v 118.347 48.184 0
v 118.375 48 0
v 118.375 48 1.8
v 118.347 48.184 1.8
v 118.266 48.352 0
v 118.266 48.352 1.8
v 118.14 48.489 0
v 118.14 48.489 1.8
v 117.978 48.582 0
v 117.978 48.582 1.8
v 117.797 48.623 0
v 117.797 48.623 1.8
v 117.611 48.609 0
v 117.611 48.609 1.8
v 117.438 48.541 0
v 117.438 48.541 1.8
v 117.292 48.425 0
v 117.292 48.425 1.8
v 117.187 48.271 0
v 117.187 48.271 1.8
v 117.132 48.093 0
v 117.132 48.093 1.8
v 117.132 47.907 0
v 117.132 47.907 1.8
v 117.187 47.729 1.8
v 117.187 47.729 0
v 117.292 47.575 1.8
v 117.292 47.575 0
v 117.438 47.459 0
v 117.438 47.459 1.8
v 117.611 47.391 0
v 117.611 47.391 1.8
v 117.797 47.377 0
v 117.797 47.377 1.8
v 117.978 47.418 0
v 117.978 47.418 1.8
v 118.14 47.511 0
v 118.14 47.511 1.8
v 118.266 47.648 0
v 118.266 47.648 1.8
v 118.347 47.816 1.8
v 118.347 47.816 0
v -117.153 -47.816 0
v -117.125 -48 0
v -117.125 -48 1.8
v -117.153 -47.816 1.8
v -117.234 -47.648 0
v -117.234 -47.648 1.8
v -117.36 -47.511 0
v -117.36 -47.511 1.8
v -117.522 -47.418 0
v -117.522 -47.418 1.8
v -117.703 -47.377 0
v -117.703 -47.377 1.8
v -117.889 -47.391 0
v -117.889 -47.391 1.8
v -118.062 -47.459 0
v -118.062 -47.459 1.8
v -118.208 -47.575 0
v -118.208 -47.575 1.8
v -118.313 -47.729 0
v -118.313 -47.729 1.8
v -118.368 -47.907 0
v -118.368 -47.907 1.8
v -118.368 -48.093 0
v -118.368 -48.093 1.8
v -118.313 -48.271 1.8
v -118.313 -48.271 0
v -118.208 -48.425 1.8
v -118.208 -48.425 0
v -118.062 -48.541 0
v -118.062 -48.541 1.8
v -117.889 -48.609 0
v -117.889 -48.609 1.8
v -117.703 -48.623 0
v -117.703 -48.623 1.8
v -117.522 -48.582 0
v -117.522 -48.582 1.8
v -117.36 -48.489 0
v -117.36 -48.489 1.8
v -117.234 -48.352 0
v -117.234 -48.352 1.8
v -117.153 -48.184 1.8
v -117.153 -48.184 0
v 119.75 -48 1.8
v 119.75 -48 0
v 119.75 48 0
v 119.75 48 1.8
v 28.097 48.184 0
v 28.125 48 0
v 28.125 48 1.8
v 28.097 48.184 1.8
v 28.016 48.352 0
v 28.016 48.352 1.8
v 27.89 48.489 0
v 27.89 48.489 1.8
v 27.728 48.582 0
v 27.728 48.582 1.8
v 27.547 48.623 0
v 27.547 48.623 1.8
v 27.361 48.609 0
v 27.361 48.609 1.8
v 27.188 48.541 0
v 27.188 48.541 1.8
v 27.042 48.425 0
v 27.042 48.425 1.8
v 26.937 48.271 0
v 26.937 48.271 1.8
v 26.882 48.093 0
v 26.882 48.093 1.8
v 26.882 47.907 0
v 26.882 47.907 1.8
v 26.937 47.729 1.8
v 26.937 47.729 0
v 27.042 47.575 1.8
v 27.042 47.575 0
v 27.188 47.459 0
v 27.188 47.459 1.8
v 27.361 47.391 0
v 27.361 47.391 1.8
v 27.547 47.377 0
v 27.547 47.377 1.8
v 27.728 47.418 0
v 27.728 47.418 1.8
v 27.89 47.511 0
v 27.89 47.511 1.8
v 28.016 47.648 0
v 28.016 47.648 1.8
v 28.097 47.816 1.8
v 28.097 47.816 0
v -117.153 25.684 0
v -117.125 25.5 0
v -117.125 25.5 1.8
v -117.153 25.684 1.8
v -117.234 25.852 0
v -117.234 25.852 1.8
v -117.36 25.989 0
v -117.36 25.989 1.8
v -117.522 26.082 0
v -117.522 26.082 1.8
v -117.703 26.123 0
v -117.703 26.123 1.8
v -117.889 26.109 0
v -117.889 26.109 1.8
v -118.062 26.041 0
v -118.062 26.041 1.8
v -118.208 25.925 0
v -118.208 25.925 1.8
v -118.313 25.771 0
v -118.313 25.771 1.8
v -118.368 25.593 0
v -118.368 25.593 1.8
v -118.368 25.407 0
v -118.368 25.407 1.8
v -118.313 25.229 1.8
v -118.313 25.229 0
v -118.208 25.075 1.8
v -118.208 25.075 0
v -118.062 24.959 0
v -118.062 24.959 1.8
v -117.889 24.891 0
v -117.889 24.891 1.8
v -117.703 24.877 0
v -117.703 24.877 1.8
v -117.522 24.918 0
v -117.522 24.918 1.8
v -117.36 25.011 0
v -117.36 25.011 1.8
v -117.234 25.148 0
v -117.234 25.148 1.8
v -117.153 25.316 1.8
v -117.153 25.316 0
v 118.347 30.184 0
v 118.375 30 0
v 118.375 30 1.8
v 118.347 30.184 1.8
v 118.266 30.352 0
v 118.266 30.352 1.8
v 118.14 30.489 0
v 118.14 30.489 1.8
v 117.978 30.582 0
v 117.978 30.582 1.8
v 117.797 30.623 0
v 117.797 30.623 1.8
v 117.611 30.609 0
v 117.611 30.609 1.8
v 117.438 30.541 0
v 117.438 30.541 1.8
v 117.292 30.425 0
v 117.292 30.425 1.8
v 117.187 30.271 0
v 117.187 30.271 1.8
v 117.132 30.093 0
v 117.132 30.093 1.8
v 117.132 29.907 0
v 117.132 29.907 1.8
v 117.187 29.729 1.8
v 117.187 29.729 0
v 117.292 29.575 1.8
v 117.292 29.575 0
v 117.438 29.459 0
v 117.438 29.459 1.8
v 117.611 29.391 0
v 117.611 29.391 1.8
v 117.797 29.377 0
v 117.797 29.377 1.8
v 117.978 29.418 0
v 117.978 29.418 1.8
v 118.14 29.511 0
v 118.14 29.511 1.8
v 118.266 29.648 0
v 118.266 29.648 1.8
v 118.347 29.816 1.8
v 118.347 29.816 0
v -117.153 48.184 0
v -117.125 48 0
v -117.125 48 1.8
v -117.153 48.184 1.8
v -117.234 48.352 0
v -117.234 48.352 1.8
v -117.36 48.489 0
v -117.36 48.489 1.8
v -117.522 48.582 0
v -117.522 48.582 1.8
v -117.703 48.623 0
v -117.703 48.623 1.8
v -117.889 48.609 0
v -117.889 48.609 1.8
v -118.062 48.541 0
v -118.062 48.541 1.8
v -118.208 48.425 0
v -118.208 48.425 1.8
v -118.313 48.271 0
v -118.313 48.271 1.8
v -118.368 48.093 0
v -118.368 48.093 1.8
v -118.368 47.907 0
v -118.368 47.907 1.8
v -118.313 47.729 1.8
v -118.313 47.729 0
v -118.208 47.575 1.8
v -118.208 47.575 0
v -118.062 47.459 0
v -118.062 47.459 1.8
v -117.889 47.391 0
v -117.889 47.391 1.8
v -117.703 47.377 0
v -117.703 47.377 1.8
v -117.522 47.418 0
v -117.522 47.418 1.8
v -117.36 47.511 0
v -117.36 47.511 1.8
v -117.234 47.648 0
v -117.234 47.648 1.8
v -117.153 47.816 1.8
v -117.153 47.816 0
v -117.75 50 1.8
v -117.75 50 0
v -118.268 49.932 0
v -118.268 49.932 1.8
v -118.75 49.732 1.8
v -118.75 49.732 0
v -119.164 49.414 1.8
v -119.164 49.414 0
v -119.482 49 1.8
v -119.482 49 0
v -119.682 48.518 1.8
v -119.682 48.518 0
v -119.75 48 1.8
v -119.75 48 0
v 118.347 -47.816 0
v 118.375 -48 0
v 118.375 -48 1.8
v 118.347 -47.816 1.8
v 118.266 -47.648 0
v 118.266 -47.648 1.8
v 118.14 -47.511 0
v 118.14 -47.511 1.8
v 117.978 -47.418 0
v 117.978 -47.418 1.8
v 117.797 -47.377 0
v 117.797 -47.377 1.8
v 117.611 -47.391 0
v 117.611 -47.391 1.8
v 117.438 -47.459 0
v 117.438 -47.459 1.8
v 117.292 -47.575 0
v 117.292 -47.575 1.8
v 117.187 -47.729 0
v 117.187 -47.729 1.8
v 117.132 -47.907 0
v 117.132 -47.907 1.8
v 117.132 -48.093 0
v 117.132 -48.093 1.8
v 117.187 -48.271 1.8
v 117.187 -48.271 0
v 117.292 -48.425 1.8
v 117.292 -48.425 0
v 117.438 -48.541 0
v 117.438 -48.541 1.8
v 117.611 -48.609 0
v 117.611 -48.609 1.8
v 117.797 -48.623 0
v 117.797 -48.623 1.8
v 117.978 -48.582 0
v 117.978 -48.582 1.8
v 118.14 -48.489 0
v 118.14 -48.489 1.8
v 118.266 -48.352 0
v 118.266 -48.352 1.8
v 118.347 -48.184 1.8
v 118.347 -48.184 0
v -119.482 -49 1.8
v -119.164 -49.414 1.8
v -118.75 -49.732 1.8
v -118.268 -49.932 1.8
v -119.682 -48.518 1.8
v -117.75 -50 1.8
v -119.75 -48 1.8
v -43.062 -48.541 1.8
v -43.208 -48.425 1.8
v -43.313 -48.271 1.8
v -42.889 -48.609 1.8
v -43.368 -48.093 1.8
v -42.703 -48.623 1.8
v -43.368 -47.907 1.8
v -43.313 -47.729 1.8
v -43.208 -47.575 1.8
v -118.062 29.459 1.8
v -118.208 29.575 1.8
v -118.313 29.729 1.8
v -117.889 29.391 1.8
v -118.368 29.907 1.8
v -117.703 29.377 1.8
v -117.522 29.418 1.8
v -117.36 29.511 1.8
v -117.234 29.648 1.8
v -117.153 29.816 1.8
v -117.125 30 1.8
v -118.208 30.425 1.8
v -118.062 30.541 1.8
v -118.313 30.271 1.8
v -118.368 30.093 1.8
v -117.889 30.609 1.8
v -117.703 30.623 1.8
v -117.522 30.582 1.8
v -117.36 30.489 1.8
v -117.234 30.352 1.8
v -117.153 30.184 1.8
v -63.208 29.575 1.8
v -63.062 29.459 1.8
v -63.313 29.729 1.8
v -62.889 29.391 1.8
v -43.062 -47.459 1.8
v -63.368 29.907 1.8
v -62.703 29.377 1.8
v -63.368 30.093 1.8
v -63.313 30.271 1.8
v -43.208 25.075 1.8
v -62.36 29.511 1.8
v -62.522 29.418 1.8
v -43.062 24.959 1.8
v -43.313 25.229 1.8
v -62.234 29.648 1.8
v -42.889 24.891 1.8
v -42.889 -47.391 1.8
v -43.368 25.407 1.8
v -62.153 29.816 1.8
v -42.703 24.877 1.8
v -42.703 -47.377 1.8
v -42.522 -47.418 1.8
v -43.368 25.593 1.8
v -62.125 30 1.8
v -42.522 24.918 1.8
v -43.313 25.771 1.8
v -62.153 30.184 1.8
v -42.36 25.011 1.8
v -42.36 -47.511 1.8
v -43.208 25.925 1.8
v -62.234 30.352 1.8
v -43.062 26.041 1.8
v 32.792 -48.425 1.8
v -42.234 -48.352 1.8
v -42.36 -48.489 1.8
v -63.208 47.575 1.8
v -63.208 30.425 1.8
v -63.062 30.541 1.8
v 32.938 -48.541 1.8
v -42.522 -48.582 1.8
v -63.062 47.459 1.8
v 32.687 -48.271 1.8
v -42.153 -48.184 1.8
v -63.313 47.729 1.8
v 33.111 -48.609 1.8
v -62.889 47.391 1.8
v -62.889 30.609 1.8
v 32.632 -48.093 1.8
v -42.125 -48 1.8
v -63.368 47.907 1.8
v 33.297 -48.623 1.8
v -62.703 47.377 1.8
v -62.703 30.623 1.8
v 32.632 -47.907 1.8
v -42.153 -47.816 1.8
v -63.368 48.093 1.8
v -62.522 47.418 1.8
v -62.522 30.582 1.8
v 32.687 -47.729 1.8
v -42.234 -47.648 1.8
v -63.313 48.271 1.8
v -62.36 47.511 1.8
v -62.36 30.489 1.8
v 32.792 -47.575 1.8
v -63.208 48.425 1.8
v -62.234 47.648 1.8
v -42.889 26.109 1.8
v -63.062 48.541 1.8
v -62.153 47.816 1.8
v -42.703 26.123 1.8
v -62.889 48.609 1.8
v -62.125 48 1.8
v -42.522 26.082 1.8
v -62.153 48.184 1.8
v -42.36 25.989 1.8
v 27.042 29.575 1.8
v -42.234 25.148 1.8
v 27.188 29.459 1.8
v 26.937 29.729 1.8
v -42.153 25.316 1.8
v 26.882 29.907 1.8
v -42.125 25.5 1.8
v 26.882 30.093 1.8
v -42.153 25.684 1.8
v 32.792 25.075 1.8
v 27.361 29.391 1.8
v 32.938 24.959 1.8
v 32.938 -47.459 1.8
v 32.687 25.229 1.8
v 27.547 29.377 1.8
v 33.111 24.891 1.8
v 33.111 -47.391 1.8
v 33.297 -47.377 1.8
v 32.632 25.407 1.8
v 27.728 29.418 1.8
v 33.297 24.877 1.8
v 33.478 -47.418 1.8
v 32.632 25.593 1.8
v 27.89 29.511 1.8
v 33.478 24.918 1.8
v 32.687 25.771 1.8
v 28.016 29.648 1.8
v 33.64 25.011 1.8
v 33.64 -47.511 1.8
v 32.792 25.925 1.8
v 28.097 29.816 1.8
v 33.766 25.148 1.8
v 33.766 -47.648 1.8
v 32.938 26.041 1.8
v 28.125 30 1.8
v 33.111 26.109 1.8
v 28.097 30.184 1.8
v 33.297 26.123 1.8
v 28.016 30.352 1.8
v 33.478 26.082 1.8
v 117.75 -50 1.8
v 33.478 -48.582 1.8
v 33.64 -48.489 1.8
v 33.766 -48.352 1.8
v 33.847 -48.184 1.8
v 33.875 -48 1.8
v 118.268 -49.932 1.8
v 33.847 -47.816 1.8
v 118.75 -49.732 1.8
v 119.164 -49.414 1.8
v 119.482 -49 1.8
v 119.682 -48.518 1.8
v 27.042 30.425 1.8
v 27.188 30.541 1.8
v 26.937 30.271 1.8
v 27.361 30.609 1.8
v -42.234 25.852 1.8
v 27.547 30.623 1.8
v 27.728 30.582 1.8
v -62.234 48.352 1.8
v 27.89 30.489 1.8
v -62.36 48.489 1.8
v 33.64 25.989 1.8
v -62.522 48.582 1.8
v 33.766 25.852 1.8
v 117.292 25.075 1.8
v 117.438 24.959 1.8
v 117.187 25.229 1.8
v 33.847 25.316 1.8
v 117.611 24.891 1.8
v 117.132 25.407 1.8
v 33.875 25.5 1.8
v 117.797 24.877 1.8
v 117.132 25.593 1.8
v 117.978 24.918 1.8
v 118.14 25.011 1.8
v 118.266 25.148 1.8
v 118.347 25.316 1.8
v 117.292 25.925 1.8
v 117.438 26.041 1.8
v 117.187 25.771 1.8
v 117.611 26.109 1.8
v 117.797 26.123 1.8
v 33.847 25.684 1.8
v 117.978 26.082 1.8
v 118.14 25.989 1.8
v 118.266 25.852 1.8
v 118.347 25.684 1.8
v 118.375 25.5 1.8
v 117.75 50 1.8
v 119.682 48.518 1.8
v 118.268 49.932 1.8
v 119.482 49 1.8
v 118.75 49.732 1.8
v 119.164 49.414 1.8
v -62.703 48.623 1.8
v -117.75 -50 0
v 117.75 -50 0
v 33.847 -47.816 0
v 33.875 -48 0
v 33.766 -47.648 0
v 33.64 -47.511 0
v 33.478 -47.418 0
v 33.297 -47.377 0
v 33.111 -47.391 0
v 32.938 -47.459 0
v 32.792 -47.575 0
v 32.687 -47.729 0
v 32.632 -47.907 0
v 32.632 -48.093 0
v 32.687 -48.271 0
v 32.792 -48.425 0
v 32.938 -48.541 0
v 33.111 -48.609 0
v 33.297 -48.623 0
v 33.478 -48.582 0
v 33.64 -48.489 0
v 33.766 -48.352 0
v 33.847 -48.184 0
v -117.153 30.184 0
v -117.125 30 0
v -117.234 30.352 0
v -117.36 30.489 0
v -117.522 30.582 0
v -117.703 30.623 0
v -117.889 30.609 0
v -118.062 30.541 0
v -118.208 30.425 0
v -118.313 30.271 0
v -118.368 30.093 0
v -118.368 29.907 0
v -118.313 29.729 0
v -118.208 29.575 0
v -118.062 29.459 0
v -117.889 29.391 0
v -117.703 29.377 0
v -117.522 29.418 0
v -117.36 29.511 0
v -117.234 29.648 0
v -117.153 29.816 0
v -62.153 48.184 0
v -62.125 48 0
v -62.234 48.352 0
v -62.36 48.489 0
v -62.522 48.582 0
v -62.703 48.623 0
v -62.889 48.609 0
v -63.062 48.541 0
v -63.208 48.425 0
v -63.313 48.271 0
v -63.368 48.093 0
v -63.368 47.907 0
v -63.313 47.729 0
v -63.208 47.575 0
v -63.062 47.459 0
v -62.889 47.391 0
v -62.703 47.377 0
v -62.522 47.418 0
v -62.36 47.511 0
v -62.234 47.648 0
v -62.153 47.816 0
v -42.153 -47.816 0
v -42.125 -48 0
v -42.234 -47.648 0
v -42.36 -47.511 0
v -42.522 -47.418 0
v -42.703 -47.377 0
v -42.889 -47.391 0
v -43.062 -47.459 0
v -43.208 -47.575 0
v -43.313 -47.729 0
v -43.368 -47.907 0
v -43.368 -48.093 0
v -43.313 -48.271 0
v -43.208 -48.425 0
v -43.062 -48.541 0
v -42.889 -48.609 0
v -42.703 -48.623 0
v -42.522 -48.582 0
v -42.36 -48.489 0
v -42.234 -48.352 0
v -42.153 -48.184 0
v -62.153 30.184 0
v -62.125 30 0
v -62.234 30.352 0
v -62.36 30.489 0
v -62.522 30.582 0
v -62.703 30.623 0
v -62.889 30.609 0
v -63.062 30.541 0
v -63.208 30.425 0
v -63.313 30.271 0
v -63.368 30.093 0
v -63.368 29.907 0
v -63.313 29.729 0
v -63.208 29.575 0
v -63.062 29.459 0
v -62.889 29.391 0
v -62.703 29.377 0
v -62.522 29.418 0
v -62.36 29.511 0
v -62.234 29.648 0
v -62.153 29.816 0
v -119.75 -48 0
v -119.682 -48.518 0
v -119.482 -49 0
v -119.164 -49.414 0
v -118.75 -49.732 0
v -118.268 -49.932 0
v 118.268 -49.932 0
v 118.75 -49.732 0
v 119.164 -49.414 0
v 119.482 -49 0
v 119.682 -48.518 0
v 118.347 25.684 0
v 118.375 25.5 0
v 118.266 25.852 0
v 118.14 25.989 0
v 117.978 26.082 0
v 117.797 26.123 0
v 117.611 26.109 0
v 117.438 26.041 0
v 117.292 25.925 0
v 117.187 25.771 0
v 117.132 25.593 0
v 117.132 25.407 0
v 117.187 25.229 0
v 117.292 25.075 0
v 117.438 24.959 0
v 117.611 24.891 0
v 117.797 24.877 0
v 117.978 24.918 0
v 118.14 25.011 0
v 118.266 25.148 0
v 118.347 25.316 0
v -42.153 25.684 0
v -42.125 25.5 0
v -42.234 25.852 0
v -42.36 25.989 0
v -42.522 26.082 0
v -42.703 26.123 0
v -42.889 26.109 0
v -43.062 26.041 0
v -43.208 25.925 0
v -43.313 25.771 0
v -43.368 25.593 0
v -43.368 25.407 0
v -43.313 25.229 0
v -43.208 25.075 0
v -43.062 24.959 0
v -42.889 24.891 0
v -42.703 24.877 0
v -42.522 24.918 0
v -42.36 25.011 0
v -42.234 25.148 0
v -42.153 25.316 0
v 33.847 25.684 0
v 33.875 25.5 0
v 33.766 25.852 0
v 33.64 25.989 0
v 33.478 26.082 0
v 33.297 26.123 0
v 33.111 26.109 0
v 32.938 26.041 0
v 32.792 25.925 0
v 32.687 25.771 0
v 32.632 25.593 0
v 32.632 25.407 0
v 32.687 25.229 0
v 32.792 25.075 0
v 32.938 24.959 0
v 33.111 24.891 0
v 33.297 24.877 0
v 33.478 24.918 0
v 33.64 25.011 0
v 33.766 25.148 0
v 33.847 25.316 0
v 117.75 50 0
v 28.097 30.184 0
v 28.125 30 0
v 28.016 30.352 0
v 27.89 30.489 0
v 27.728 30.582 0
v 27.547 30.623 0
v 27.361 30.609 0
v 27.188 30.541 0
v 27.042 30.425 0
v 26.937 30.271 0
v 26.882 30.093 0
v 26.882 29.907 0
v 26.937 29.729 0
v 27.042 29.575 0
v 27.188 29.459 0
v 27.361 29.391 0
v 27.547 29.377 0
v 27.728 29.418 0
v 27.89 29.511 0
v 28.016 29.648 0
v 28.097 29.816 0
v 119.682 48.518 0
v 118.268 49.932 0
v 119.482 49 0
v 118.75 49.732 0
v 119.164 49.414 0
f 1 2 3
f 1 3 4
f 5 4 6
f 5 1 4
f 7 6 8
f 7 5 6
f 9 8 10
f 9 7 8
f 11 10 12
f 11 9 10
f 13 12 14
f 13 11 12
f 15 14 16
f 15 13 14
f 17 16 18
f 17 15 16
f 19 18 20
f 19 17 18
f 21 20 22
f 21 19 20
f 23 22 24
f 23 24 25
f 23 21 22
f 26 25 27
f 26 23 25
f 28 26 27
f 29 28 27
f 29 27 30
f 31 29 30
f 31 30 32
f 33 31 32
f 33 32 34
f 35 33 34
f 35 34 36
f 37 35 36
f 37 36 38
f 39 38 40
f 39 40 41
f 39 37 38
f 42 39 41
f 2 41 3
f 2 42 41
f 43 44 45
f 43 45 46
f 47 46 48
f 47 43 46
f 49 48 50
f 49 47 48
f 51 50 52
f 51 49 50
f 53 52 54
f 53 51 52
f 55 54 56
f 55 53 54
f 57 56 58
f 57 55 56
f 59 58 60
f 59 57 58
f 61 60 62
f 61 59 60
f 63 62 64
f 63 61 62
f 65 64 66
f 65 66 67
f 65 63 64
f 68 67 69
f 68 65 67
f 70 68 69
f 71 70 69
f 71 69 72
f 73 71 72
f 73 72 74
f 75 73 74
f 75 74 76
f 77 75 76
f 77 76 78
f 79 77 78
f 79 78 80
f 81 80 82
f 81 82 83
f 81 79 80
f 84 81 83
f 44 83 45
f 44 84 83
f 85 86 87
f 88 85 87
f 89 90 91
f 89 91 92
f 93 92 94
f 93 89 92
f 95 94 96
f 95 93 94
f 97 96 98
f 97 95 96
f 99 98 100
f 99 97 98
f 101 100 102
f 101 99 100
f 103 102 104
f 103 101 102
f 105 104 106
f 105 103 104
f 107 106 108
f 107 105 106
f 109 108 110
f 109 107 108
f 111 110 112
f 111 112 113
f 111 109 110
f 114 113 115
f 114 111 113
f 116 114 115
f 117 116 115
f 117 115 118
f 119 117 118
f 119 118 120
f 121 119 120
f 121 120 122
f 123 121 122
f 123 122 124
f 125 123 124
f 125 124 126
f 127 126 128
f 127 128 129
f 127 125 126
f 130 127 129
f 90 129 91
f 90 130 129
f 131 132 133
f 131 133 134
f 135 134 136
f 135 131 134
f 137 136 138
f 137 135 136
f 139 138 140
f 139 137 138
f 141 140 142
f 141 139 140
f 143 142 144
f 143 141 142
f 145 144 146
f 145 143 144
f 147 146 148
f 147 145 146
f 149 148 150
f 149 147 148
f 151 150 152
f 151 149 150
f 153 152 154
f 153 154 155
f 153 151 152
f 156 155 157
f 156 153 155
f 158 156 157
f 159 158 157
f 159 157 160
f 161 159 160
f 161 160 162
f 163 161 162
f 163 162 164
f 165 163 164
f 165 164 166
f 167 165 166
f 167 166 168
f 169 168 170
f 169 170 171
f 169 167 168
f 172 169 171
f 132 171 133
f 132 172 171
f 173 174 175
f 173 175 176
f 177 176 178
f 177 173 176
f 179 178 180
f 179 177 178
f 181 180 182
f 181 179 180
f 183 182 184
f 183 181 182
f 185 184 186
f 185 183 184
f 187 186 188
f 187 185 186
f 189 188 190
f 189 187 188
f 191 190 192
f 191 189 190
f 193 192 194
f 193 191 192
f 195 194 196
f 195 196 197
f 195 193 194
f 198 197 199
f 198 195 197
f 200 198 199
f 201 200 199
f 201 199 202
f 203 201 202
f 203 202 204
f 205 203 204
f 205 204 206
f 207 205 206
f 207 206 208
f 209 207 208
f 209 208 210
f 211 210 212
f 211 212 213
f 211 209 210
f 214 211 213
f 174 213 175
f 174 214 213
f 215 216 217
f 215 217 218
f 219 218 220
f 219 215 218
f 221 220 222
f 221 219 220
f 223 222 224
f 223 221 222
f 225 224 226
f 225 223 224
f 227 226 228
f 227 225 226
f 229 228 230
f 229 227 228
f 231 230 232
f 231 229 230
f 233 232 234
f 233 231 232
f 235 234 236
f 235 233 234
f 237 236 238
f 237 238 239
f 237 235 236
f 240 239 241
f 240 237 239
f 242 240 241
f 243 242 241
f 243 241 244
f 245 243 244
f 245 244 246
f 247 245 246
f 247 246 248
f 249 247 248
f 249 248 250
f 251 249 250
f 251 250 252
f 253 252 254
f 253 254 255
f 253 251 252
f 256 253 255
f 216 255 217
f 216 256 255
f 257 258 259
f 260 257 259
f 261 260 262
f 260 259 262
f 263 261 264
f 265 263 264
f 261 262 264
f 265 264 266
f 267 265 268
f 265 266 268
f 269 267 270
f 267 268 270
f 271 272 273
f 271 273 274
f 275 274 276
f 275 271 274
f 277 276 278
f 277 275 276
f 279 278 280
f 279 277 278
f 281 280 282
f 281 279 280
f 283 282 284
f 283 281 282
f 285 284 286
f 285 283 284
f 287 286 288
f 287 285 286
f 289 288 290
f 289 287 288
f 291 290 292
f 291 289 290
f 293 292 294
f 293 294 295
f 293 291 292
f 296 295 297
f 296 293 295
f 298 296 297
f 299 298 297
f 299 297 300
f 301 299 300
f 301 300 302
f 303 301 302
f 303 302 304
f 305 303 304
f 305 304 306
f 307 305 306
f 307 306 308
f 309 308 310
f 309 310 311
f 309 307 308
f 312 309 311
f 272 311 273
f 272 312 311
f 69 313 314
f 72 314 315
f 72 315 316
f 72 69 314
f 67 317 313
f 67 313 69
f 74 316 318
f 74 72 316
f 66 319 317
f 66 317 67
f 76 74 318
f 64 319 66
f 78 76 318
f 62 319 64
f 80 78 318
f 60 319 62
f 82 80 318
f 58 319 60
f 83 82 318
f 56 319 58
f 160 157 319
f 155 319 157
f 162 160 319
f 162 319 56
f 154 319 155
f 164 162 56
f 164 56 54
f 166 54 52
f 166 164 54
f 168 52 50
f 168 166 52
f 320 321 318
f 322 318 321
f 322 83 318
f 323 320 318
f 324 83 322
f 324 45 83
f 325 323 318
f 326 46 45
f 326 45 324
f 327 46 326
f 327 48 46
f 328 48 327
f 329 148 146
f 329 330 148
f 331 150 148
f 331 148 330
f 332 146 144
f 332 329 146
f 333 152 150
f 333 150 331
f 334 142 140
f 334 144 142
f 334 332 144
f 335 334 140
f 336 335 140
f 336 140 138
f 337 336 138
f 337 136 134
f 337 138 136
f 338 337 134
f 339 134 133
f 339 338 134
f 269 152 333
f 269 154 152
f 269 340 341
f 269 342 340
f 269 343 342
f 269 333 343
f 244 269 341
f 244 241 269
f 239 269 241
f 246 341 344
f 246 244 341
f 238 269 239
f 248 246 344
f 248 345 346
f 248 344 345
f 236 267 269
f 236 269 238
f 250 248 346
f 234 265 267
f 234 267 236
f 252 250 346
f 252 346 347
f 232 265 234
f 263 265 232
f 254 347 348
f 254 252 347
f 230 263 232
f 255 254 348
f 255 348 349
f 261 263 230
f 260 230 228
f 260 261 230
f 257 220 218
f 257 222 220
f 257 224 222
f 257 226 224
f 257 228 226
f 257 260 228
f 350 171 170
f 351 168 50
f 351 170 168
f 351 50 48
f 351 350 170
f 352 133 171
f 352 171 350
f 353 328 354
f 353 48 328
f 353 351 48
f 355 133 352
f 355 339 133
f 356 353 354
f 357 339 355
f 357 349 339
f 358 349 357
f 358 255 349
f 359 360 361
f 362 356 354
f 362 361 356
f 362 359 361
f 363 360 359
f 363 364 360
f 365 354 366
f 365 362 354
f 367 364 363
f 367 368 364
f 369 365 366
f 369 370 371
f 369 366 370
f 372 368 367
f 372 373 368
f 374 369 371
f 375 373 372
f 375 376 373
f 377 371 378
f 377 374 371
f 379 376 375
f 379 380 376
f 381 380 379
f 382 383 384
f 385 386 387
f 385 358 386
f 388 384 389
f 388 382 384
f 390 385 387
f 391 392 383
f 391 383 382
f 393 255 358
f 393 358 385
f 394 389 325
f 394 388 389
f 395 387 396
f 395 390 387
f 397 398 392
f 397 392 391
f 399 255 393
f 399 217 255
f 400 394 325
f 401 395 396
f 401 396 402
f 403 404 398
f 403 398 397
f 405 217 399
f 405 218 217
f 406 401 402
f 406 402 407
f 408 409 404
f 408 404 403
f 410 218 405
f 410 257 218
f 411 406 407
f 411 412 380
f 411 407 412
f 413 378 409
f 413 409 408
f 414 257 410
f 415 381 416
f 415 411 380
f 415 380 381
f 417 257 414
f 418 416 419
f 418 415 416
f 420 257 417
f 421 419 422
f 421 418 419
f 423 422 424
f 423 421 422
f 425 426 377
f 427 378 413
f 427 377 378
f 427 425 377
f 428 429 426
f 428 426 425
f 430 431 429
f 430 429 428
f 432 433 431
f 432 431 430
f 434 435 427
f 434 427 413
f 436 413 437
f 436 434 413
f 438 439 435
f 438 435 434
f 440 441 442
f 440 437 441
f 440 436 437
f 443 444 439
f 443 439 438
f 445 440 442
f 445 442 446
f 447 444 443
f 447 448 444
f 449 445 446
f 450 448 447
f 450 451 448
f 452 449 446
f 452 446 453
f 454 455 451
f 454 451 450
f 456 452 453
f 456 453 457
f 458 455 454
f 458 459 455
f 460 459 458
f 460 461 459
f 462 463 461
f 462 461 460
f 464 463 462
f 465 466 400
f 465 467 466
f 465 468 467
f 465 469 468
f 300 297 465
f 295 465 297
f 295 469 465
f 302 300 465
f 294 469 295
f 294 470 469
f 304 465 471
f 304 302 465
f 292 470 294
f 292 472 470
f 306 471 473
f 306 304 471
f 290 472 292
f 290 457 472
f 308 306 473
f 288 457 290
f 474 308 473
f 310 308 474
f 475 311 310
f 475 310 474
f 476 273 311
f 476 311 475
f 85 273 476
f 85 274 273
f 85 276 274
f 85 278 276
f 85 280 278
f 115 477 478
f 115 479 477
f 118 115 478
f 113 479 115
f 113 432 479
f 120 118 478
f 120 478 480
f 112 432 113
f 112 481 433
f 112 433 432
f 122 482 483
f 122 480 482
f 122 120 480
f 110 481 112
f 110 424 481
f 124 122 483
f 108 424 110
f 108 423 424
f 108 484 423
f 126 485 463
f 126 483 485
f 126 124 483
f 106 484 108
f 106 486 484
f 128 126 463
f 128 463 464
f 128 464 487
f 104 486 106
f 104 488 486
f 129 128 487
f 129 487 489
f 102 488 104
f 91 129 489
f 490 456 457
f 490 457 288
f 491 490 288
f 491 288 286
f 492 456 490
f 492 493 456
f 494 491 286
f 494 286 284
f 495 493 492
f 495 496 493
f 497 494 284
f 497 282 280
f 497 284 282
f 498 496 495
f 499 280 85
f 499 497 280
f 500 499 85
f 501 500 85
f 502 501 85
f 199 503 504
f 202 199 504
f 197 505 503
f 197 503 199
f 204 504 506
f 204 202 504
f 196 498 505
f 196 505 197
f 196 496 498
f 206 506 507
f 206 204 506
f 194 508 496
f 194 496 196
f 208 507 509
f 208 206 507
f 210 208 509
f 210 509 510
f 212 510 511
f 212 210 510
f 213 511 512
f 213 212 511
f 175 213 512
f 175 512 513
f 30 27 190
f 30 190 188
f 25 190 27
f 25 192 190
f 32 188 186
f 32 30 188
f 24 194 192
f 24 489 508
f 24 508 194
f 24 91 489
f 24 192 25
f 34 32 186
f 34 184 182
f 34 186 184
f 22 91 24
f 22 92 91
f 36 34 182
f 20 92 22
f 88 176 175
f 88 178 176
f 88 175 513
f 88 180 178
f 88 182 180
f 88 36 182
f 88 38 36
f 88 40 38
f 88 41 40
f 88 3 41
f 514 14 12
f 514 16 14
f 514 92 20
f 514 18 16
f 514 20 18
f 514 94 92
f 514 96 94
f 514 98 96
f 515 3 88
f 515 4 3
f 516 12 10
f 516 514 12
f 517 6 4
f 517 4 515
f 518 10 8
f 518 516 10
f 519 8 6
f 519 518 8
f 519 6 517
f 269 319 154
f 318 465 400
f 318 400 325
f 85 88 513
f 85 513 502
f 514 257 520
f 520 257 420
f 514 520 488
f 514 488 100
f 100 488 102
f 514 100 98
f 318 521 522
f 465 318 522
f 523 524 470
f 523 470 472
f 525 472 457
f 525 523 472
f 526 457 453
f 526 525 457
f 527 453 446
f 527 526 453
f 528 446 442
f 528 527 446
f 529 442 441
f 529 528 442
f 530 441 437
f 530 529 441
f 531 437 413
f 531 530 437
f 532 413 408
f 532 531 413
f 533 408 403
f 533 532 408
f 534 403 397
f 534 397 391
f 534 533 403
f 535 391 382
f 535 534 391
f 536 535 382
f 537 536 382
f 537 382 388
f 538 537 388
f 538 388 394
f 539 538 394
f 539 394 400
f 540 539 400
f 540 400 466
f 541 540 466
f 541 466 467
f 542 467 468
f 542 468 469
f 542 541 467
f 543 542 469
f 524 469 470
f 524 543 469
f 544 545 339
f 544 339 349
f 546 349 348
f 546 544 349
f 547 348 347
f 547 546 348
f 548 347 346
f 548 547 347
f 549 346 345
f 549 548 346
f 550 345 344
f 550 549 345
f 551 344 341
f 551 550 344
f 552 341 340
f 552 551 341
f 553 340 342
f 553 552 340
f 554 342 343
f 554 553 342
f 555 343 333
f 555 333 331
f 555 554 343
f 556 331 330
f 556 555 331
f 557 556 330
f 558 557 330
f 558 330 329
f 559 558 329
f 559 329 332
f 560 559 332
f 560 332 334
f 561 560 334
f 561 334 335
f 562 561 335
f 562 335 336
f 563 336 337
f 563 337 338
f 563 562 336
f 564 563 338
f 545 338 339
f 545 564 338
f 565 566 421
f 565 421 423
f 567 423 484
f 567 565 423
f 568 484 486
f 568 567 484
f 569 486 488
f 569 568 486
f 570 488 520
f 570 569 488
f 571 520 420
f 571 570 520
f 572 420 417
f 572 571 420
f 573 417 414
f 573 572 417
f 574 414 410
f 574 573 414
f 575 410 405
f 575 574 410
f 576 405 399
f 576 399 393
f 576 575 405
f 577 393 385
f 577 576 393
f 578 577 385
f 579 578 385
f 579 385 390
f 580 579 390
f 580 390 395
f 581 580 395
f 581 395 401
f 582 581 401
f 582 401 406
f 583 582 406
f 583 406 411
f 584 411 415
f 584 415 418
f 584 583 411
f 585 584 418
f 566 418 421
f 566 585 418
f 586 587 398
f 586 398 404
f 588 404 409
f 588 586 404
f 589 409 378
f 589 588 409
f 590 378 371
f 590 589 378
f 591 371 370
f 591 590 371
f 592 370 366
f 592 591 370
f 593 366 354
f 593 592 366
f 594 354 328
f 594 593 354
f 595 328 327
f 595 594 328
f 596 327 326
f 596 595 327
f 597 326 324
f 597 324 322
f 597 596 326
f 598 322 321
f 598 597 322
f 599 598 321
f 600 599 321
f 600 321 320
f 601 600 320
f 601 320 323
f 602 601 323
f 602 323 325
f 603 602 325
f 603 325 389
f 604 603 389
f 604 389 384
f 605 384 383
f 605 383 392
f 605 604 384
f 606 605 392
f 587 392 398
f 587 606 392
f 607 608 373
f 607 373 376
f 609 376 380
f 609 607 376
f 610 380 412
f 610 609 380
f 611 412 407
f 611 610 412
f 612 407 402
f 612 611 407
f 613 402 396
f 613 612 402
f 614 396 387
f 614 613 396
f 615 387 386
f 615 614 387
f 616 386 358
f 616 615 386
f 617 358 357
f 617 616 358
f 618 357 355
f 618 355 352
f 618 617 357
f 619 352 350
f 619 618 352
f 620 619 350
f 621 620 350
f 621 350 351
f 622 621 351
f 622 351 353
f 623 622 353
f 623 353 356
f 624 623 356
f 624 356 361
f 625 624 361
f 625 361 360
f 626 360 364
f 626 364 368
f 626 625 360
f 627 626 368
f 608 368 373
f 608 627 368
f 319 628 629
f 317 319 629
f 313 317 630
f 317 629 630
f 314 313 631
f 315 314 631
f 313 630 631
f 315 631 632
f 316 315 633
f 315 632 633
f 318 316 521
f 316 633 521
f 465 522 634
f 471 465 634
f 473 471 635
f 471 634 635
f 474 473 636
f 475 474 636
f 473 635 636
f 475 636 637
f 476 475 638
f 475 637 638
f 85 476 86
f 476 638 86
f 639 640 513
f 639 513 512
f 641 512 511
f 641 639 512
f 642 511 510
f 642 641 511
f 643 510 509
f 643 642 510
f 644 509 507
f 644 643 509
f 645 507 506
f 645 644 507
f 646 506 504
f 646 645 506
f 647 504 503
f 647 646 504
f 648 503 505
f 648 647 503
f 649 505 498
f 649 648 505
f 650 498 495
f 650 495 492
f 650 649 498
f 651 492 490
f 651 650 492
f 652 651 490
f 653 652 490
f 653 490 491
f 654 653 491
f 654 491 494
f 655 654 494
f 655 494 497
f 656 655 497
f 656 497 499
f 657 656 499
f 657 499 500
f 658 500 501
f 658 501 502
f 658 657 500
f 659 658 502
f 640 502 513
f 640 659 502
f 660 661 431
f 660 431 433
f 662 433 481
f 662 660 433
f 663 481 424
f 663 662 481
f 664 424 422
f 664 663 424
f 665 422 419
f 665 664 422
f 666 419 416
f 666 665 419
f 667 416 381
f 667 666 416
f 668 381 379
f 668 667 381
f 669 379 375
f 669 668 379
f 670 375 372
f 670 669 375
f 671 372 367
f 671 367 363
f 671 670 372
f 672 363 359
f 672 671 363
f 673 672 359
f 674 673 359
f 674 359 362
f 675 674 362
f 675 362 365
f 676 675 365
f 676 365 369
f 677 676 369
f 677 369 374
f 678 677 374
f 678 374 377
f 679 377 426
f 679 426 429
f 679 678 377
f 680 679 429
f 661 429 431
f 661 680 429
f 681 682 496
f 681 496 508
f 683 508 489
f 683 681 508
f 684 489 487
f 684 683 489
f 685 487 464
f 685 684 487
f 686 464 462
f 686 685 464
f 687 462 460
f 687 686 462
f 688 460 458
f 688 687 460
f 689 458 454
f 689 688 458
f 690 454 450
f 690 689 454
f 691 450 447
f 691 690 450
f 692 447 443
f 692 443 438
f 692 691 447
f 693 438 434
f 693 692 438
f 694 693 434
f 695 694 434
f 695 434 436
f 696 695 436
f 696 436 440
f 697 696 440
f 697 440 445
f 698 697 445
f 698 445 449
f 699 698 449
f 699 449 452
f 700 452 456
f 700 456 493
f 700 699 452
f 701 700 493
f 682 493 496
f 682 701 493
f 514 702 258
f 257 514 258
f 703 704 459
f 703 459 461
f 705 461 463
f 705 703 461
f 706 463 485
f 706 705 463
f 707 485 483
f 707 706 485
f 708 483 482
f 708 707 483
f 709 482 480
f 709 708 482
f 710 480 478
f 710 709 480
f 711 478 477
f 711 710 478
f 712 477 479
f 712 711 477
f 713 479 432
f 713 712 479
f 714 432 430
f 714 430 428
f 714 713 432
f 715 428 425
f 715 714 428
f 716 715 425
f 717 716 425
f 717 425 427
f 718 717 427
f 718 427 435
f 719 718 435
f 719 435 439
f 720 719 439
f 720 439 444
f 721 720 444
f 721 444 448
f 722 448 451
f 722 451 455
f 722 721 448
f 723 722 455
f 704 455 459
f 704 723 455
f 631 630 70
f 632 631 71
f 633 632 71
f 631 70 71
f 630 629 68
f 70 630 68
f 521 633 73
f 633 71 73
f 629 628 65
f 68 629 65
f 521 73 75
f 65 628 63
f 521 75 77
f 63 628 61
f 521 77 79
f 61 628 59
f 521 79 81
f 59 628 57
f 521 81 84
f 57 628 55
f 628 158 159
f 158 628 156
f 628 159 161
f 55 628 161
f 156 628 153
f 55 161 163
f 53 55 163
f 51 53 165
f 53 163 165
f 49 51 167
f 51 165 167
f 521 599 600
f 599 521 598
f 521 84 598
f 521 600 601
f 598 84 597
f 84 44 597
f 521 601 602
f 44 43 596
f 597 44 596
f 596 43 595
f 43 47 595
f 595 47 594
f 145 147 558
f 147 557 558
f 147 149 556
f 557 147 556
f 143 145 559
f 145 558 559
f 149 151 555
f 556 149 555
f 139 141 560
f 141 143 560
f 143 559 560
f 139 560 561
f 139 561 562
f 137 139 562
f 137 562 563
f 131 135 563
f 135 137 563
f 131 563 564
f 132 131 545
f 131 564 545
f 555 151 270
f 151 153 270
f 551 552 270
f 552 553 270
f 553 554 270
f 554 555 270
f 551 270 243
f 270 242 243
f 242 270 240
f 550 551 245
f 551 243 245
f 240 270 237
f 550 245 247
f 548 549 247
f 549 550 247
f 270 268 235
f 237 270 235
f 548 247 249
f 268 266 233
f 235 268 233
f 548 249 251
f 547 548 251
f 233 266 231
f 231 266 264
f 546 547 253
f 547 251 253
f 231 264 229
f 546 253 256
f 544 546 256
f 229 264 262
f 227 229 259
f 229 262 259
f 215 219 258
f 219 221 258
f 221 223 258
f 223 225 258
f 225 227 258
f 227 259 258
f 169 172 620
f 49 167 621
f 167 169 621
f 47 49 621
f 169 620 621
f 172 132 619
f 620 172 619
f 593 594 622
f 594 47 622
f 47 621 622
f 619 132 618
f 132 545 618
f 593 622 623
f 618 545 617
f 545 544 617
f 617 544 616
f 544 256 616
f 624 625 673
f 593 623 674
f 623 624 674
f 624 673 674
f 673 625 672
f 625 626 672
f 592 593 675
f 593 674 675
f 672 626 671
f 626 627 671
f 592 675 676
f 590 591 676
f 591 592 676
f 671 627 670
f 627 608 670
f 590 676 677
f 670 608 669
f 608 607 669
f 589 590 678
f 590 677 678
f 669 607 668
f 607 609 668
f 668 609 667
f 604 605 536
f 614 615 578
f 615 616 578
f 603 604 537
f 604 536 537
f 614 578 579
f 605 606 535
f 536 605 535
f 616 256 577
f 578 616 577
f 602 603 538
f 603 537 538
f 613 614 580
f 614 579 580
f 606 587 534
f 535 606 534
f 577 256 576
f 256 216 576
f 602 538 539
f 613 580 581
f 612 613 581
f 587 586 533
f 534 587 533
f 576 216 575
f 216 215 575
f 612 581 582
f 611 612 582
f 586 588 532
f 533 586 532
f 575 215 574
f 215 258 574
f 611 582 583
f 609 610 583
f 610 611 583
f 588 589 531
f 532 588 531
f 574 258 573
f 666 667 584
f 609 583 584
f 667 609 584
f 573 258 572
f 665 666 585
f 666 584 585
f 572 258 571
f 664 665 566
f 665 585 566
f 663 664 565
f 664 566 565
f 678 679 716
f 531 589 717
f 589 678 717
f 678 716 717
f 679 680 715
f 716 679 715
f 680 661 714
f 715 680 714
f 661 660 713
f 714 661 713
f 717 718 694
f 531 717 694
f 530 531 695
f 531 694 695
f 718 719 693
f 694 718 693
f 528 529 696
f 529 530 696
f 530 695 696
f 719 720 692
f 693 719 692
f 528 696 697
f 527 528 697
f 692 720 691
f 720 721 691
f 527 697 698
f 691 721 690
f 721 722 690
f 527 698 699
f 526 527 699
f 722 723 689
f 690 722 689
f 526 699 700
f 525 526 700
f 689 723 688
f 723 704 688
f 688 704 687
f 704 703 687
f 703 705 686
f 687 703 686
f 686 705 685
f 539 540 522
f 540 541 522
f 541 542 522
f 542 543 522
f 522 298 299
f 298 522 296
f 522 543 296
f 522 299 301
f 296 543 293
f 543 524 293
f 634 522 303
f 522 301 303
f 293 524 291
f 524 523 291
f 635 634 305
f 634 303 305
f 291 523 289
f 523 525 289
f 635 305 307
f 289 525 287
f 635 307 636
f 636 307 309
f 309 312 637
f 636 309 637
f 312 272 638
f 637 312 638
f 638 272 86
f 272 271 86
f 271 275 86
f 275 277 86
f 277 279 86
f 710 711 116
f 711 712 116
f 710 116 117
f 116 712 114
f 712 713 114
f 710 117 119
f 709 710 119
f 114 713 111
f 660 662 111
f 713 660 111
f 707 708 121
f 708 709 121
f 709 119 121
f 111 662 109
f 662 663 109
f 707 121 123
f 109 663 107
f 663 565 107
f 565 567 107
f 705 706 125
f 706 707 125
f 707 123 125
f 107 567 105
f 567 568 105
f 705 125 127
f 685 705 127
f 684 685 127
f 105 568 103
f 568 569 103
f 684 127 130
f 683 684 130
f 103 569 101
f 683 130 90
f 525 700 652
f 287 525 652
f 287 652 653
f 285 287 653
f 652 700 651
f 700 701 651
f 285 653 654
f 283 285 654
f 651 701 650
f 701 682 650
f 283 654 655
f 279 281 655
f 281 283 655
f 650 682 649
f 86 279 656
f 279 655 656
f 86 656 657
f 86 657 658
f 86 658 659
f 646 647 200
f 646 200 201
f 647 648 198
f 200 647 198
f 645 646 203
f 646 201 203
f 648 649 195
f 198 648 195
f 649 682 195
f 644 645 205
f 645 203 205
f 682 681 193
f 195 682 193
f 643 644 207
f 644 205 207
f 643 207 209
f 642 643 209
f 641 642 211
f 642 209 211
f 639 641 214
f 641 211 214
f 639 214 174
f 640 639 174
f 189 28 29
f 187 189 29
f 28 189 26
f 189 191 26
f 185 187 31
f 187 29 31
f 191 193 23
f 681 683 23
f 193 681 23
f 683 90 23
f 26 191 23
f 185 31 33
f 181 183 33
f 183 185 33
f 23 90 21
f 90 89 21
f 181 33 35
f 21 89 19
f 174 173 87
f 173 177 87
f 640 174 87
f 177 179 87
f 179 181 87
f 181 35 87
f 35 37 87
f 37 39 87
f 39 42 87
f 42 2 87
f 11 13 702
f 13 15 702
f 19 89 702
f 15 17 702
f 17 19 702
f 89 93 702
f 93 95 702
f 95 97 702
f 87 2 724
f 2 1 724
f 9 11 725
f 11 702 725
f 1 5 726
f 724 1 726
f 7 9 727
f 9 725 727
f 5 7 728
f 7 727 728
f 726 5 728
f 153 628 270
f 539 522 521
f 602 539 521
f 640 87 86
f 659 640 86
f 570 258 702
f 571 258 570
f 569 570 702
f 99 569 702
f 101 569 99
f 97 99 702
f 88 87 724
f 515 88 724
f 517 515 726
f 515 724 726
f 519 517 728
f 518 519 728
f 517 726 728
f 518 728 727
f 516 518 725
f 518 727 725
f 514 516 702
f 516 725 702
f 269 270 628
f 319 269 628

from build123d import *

# Parameters (mm, degrees)
SKETCH_R  = 0.625
PAD_DEPTH = 1.8


with BuildPart() as part:
    # Sketch → Pad (new body)
    with BuildSketch(Plane.XY):
        with BuildLine():
            Line((-119.75, 48), (-119.75, -48))
            ThreePointArc((-119.75, -48), (-119.164214, -49.414214), (-117.75, -50))
            Line((-117.75, -50), (117.75, -50))
            ThreePointArc((117.75, -50), (119.164214, -49.414214), (119.75, -48))
            Line((119.75, -48), (119.75, 48))
            ThreePointArc((119.75, 48), (119.164214, 49.414214), (117.75, 50))
            Line((117.75, 50), (-117.75, 50))
            ThreePointArc((-117.75, 50), (-119.164214, 49.414214), (-119.75, 48))
        make_face()
        with Locations((-117.75, 48)):
            Circle(SKETCH_R, mode=Mode.SUBTRACT)
        with Locations((117.75, 48)):
            Circle(SKETCH_R, mode=Mode.SUBTRACT)
        with Locations((117.75, -48)):
            Circle(SKETCH_R, mode=Mode.SUBTRACT)
        with Locations((-117.75, -48)):
            Circle(SKETCH_R, mode=Mode.SUBTRACT)
        with Locations((-117.75, 30)):
            Circle(SKETCH_R, mode=Mode.SUBTRACT)
        with Locations((-62.75, 48)):
            Circle(SKETCH_R, mode=Mode.SUBTRACT)
        with Locations((-62.75, 30)):
            Circle(SKETCH_R, mode=Mode.SUBTRACT)
        with Locations((27.5, 48)):
            Circle(SKETCH_R, mode=Mode.SUBTRACT)
        with Locations((33.25, -48)):
            Circle(SKETCH_R, mode=Mode.SUBTRACT)
        with Locations((-42.75, -48)):
            Circle(SKETCH_R, mode=Mode.SUBTRACT)
        with Locations((117.75, 30)):
            Circle(SKETCH_R, mode=Mode.SUBTRACT)
        with Locations((117.75, 25.5)):
            Circle(SKETCH_R, mode=Mode.SUBTRACT)
        with Locations((27.5, 30)):
            Circle(SKETCH_R, mode=Mode.SUBTRACT)
        with Locations((-117.75, 25.5)):
            Circle(SKETCH_R, mode=Mode.SUBTRACT)
        with Locations((33.25, 25.5)):
            Circle(SKETCH_R, mode=Mode.SUBTRACT)
        with Locations((-42.75, 25.5)):
            Circle(SKETCH_R, mode=Mode.SUBTRACT)
    extrude(amount=PAD_DEPTH)


solid = part.part
